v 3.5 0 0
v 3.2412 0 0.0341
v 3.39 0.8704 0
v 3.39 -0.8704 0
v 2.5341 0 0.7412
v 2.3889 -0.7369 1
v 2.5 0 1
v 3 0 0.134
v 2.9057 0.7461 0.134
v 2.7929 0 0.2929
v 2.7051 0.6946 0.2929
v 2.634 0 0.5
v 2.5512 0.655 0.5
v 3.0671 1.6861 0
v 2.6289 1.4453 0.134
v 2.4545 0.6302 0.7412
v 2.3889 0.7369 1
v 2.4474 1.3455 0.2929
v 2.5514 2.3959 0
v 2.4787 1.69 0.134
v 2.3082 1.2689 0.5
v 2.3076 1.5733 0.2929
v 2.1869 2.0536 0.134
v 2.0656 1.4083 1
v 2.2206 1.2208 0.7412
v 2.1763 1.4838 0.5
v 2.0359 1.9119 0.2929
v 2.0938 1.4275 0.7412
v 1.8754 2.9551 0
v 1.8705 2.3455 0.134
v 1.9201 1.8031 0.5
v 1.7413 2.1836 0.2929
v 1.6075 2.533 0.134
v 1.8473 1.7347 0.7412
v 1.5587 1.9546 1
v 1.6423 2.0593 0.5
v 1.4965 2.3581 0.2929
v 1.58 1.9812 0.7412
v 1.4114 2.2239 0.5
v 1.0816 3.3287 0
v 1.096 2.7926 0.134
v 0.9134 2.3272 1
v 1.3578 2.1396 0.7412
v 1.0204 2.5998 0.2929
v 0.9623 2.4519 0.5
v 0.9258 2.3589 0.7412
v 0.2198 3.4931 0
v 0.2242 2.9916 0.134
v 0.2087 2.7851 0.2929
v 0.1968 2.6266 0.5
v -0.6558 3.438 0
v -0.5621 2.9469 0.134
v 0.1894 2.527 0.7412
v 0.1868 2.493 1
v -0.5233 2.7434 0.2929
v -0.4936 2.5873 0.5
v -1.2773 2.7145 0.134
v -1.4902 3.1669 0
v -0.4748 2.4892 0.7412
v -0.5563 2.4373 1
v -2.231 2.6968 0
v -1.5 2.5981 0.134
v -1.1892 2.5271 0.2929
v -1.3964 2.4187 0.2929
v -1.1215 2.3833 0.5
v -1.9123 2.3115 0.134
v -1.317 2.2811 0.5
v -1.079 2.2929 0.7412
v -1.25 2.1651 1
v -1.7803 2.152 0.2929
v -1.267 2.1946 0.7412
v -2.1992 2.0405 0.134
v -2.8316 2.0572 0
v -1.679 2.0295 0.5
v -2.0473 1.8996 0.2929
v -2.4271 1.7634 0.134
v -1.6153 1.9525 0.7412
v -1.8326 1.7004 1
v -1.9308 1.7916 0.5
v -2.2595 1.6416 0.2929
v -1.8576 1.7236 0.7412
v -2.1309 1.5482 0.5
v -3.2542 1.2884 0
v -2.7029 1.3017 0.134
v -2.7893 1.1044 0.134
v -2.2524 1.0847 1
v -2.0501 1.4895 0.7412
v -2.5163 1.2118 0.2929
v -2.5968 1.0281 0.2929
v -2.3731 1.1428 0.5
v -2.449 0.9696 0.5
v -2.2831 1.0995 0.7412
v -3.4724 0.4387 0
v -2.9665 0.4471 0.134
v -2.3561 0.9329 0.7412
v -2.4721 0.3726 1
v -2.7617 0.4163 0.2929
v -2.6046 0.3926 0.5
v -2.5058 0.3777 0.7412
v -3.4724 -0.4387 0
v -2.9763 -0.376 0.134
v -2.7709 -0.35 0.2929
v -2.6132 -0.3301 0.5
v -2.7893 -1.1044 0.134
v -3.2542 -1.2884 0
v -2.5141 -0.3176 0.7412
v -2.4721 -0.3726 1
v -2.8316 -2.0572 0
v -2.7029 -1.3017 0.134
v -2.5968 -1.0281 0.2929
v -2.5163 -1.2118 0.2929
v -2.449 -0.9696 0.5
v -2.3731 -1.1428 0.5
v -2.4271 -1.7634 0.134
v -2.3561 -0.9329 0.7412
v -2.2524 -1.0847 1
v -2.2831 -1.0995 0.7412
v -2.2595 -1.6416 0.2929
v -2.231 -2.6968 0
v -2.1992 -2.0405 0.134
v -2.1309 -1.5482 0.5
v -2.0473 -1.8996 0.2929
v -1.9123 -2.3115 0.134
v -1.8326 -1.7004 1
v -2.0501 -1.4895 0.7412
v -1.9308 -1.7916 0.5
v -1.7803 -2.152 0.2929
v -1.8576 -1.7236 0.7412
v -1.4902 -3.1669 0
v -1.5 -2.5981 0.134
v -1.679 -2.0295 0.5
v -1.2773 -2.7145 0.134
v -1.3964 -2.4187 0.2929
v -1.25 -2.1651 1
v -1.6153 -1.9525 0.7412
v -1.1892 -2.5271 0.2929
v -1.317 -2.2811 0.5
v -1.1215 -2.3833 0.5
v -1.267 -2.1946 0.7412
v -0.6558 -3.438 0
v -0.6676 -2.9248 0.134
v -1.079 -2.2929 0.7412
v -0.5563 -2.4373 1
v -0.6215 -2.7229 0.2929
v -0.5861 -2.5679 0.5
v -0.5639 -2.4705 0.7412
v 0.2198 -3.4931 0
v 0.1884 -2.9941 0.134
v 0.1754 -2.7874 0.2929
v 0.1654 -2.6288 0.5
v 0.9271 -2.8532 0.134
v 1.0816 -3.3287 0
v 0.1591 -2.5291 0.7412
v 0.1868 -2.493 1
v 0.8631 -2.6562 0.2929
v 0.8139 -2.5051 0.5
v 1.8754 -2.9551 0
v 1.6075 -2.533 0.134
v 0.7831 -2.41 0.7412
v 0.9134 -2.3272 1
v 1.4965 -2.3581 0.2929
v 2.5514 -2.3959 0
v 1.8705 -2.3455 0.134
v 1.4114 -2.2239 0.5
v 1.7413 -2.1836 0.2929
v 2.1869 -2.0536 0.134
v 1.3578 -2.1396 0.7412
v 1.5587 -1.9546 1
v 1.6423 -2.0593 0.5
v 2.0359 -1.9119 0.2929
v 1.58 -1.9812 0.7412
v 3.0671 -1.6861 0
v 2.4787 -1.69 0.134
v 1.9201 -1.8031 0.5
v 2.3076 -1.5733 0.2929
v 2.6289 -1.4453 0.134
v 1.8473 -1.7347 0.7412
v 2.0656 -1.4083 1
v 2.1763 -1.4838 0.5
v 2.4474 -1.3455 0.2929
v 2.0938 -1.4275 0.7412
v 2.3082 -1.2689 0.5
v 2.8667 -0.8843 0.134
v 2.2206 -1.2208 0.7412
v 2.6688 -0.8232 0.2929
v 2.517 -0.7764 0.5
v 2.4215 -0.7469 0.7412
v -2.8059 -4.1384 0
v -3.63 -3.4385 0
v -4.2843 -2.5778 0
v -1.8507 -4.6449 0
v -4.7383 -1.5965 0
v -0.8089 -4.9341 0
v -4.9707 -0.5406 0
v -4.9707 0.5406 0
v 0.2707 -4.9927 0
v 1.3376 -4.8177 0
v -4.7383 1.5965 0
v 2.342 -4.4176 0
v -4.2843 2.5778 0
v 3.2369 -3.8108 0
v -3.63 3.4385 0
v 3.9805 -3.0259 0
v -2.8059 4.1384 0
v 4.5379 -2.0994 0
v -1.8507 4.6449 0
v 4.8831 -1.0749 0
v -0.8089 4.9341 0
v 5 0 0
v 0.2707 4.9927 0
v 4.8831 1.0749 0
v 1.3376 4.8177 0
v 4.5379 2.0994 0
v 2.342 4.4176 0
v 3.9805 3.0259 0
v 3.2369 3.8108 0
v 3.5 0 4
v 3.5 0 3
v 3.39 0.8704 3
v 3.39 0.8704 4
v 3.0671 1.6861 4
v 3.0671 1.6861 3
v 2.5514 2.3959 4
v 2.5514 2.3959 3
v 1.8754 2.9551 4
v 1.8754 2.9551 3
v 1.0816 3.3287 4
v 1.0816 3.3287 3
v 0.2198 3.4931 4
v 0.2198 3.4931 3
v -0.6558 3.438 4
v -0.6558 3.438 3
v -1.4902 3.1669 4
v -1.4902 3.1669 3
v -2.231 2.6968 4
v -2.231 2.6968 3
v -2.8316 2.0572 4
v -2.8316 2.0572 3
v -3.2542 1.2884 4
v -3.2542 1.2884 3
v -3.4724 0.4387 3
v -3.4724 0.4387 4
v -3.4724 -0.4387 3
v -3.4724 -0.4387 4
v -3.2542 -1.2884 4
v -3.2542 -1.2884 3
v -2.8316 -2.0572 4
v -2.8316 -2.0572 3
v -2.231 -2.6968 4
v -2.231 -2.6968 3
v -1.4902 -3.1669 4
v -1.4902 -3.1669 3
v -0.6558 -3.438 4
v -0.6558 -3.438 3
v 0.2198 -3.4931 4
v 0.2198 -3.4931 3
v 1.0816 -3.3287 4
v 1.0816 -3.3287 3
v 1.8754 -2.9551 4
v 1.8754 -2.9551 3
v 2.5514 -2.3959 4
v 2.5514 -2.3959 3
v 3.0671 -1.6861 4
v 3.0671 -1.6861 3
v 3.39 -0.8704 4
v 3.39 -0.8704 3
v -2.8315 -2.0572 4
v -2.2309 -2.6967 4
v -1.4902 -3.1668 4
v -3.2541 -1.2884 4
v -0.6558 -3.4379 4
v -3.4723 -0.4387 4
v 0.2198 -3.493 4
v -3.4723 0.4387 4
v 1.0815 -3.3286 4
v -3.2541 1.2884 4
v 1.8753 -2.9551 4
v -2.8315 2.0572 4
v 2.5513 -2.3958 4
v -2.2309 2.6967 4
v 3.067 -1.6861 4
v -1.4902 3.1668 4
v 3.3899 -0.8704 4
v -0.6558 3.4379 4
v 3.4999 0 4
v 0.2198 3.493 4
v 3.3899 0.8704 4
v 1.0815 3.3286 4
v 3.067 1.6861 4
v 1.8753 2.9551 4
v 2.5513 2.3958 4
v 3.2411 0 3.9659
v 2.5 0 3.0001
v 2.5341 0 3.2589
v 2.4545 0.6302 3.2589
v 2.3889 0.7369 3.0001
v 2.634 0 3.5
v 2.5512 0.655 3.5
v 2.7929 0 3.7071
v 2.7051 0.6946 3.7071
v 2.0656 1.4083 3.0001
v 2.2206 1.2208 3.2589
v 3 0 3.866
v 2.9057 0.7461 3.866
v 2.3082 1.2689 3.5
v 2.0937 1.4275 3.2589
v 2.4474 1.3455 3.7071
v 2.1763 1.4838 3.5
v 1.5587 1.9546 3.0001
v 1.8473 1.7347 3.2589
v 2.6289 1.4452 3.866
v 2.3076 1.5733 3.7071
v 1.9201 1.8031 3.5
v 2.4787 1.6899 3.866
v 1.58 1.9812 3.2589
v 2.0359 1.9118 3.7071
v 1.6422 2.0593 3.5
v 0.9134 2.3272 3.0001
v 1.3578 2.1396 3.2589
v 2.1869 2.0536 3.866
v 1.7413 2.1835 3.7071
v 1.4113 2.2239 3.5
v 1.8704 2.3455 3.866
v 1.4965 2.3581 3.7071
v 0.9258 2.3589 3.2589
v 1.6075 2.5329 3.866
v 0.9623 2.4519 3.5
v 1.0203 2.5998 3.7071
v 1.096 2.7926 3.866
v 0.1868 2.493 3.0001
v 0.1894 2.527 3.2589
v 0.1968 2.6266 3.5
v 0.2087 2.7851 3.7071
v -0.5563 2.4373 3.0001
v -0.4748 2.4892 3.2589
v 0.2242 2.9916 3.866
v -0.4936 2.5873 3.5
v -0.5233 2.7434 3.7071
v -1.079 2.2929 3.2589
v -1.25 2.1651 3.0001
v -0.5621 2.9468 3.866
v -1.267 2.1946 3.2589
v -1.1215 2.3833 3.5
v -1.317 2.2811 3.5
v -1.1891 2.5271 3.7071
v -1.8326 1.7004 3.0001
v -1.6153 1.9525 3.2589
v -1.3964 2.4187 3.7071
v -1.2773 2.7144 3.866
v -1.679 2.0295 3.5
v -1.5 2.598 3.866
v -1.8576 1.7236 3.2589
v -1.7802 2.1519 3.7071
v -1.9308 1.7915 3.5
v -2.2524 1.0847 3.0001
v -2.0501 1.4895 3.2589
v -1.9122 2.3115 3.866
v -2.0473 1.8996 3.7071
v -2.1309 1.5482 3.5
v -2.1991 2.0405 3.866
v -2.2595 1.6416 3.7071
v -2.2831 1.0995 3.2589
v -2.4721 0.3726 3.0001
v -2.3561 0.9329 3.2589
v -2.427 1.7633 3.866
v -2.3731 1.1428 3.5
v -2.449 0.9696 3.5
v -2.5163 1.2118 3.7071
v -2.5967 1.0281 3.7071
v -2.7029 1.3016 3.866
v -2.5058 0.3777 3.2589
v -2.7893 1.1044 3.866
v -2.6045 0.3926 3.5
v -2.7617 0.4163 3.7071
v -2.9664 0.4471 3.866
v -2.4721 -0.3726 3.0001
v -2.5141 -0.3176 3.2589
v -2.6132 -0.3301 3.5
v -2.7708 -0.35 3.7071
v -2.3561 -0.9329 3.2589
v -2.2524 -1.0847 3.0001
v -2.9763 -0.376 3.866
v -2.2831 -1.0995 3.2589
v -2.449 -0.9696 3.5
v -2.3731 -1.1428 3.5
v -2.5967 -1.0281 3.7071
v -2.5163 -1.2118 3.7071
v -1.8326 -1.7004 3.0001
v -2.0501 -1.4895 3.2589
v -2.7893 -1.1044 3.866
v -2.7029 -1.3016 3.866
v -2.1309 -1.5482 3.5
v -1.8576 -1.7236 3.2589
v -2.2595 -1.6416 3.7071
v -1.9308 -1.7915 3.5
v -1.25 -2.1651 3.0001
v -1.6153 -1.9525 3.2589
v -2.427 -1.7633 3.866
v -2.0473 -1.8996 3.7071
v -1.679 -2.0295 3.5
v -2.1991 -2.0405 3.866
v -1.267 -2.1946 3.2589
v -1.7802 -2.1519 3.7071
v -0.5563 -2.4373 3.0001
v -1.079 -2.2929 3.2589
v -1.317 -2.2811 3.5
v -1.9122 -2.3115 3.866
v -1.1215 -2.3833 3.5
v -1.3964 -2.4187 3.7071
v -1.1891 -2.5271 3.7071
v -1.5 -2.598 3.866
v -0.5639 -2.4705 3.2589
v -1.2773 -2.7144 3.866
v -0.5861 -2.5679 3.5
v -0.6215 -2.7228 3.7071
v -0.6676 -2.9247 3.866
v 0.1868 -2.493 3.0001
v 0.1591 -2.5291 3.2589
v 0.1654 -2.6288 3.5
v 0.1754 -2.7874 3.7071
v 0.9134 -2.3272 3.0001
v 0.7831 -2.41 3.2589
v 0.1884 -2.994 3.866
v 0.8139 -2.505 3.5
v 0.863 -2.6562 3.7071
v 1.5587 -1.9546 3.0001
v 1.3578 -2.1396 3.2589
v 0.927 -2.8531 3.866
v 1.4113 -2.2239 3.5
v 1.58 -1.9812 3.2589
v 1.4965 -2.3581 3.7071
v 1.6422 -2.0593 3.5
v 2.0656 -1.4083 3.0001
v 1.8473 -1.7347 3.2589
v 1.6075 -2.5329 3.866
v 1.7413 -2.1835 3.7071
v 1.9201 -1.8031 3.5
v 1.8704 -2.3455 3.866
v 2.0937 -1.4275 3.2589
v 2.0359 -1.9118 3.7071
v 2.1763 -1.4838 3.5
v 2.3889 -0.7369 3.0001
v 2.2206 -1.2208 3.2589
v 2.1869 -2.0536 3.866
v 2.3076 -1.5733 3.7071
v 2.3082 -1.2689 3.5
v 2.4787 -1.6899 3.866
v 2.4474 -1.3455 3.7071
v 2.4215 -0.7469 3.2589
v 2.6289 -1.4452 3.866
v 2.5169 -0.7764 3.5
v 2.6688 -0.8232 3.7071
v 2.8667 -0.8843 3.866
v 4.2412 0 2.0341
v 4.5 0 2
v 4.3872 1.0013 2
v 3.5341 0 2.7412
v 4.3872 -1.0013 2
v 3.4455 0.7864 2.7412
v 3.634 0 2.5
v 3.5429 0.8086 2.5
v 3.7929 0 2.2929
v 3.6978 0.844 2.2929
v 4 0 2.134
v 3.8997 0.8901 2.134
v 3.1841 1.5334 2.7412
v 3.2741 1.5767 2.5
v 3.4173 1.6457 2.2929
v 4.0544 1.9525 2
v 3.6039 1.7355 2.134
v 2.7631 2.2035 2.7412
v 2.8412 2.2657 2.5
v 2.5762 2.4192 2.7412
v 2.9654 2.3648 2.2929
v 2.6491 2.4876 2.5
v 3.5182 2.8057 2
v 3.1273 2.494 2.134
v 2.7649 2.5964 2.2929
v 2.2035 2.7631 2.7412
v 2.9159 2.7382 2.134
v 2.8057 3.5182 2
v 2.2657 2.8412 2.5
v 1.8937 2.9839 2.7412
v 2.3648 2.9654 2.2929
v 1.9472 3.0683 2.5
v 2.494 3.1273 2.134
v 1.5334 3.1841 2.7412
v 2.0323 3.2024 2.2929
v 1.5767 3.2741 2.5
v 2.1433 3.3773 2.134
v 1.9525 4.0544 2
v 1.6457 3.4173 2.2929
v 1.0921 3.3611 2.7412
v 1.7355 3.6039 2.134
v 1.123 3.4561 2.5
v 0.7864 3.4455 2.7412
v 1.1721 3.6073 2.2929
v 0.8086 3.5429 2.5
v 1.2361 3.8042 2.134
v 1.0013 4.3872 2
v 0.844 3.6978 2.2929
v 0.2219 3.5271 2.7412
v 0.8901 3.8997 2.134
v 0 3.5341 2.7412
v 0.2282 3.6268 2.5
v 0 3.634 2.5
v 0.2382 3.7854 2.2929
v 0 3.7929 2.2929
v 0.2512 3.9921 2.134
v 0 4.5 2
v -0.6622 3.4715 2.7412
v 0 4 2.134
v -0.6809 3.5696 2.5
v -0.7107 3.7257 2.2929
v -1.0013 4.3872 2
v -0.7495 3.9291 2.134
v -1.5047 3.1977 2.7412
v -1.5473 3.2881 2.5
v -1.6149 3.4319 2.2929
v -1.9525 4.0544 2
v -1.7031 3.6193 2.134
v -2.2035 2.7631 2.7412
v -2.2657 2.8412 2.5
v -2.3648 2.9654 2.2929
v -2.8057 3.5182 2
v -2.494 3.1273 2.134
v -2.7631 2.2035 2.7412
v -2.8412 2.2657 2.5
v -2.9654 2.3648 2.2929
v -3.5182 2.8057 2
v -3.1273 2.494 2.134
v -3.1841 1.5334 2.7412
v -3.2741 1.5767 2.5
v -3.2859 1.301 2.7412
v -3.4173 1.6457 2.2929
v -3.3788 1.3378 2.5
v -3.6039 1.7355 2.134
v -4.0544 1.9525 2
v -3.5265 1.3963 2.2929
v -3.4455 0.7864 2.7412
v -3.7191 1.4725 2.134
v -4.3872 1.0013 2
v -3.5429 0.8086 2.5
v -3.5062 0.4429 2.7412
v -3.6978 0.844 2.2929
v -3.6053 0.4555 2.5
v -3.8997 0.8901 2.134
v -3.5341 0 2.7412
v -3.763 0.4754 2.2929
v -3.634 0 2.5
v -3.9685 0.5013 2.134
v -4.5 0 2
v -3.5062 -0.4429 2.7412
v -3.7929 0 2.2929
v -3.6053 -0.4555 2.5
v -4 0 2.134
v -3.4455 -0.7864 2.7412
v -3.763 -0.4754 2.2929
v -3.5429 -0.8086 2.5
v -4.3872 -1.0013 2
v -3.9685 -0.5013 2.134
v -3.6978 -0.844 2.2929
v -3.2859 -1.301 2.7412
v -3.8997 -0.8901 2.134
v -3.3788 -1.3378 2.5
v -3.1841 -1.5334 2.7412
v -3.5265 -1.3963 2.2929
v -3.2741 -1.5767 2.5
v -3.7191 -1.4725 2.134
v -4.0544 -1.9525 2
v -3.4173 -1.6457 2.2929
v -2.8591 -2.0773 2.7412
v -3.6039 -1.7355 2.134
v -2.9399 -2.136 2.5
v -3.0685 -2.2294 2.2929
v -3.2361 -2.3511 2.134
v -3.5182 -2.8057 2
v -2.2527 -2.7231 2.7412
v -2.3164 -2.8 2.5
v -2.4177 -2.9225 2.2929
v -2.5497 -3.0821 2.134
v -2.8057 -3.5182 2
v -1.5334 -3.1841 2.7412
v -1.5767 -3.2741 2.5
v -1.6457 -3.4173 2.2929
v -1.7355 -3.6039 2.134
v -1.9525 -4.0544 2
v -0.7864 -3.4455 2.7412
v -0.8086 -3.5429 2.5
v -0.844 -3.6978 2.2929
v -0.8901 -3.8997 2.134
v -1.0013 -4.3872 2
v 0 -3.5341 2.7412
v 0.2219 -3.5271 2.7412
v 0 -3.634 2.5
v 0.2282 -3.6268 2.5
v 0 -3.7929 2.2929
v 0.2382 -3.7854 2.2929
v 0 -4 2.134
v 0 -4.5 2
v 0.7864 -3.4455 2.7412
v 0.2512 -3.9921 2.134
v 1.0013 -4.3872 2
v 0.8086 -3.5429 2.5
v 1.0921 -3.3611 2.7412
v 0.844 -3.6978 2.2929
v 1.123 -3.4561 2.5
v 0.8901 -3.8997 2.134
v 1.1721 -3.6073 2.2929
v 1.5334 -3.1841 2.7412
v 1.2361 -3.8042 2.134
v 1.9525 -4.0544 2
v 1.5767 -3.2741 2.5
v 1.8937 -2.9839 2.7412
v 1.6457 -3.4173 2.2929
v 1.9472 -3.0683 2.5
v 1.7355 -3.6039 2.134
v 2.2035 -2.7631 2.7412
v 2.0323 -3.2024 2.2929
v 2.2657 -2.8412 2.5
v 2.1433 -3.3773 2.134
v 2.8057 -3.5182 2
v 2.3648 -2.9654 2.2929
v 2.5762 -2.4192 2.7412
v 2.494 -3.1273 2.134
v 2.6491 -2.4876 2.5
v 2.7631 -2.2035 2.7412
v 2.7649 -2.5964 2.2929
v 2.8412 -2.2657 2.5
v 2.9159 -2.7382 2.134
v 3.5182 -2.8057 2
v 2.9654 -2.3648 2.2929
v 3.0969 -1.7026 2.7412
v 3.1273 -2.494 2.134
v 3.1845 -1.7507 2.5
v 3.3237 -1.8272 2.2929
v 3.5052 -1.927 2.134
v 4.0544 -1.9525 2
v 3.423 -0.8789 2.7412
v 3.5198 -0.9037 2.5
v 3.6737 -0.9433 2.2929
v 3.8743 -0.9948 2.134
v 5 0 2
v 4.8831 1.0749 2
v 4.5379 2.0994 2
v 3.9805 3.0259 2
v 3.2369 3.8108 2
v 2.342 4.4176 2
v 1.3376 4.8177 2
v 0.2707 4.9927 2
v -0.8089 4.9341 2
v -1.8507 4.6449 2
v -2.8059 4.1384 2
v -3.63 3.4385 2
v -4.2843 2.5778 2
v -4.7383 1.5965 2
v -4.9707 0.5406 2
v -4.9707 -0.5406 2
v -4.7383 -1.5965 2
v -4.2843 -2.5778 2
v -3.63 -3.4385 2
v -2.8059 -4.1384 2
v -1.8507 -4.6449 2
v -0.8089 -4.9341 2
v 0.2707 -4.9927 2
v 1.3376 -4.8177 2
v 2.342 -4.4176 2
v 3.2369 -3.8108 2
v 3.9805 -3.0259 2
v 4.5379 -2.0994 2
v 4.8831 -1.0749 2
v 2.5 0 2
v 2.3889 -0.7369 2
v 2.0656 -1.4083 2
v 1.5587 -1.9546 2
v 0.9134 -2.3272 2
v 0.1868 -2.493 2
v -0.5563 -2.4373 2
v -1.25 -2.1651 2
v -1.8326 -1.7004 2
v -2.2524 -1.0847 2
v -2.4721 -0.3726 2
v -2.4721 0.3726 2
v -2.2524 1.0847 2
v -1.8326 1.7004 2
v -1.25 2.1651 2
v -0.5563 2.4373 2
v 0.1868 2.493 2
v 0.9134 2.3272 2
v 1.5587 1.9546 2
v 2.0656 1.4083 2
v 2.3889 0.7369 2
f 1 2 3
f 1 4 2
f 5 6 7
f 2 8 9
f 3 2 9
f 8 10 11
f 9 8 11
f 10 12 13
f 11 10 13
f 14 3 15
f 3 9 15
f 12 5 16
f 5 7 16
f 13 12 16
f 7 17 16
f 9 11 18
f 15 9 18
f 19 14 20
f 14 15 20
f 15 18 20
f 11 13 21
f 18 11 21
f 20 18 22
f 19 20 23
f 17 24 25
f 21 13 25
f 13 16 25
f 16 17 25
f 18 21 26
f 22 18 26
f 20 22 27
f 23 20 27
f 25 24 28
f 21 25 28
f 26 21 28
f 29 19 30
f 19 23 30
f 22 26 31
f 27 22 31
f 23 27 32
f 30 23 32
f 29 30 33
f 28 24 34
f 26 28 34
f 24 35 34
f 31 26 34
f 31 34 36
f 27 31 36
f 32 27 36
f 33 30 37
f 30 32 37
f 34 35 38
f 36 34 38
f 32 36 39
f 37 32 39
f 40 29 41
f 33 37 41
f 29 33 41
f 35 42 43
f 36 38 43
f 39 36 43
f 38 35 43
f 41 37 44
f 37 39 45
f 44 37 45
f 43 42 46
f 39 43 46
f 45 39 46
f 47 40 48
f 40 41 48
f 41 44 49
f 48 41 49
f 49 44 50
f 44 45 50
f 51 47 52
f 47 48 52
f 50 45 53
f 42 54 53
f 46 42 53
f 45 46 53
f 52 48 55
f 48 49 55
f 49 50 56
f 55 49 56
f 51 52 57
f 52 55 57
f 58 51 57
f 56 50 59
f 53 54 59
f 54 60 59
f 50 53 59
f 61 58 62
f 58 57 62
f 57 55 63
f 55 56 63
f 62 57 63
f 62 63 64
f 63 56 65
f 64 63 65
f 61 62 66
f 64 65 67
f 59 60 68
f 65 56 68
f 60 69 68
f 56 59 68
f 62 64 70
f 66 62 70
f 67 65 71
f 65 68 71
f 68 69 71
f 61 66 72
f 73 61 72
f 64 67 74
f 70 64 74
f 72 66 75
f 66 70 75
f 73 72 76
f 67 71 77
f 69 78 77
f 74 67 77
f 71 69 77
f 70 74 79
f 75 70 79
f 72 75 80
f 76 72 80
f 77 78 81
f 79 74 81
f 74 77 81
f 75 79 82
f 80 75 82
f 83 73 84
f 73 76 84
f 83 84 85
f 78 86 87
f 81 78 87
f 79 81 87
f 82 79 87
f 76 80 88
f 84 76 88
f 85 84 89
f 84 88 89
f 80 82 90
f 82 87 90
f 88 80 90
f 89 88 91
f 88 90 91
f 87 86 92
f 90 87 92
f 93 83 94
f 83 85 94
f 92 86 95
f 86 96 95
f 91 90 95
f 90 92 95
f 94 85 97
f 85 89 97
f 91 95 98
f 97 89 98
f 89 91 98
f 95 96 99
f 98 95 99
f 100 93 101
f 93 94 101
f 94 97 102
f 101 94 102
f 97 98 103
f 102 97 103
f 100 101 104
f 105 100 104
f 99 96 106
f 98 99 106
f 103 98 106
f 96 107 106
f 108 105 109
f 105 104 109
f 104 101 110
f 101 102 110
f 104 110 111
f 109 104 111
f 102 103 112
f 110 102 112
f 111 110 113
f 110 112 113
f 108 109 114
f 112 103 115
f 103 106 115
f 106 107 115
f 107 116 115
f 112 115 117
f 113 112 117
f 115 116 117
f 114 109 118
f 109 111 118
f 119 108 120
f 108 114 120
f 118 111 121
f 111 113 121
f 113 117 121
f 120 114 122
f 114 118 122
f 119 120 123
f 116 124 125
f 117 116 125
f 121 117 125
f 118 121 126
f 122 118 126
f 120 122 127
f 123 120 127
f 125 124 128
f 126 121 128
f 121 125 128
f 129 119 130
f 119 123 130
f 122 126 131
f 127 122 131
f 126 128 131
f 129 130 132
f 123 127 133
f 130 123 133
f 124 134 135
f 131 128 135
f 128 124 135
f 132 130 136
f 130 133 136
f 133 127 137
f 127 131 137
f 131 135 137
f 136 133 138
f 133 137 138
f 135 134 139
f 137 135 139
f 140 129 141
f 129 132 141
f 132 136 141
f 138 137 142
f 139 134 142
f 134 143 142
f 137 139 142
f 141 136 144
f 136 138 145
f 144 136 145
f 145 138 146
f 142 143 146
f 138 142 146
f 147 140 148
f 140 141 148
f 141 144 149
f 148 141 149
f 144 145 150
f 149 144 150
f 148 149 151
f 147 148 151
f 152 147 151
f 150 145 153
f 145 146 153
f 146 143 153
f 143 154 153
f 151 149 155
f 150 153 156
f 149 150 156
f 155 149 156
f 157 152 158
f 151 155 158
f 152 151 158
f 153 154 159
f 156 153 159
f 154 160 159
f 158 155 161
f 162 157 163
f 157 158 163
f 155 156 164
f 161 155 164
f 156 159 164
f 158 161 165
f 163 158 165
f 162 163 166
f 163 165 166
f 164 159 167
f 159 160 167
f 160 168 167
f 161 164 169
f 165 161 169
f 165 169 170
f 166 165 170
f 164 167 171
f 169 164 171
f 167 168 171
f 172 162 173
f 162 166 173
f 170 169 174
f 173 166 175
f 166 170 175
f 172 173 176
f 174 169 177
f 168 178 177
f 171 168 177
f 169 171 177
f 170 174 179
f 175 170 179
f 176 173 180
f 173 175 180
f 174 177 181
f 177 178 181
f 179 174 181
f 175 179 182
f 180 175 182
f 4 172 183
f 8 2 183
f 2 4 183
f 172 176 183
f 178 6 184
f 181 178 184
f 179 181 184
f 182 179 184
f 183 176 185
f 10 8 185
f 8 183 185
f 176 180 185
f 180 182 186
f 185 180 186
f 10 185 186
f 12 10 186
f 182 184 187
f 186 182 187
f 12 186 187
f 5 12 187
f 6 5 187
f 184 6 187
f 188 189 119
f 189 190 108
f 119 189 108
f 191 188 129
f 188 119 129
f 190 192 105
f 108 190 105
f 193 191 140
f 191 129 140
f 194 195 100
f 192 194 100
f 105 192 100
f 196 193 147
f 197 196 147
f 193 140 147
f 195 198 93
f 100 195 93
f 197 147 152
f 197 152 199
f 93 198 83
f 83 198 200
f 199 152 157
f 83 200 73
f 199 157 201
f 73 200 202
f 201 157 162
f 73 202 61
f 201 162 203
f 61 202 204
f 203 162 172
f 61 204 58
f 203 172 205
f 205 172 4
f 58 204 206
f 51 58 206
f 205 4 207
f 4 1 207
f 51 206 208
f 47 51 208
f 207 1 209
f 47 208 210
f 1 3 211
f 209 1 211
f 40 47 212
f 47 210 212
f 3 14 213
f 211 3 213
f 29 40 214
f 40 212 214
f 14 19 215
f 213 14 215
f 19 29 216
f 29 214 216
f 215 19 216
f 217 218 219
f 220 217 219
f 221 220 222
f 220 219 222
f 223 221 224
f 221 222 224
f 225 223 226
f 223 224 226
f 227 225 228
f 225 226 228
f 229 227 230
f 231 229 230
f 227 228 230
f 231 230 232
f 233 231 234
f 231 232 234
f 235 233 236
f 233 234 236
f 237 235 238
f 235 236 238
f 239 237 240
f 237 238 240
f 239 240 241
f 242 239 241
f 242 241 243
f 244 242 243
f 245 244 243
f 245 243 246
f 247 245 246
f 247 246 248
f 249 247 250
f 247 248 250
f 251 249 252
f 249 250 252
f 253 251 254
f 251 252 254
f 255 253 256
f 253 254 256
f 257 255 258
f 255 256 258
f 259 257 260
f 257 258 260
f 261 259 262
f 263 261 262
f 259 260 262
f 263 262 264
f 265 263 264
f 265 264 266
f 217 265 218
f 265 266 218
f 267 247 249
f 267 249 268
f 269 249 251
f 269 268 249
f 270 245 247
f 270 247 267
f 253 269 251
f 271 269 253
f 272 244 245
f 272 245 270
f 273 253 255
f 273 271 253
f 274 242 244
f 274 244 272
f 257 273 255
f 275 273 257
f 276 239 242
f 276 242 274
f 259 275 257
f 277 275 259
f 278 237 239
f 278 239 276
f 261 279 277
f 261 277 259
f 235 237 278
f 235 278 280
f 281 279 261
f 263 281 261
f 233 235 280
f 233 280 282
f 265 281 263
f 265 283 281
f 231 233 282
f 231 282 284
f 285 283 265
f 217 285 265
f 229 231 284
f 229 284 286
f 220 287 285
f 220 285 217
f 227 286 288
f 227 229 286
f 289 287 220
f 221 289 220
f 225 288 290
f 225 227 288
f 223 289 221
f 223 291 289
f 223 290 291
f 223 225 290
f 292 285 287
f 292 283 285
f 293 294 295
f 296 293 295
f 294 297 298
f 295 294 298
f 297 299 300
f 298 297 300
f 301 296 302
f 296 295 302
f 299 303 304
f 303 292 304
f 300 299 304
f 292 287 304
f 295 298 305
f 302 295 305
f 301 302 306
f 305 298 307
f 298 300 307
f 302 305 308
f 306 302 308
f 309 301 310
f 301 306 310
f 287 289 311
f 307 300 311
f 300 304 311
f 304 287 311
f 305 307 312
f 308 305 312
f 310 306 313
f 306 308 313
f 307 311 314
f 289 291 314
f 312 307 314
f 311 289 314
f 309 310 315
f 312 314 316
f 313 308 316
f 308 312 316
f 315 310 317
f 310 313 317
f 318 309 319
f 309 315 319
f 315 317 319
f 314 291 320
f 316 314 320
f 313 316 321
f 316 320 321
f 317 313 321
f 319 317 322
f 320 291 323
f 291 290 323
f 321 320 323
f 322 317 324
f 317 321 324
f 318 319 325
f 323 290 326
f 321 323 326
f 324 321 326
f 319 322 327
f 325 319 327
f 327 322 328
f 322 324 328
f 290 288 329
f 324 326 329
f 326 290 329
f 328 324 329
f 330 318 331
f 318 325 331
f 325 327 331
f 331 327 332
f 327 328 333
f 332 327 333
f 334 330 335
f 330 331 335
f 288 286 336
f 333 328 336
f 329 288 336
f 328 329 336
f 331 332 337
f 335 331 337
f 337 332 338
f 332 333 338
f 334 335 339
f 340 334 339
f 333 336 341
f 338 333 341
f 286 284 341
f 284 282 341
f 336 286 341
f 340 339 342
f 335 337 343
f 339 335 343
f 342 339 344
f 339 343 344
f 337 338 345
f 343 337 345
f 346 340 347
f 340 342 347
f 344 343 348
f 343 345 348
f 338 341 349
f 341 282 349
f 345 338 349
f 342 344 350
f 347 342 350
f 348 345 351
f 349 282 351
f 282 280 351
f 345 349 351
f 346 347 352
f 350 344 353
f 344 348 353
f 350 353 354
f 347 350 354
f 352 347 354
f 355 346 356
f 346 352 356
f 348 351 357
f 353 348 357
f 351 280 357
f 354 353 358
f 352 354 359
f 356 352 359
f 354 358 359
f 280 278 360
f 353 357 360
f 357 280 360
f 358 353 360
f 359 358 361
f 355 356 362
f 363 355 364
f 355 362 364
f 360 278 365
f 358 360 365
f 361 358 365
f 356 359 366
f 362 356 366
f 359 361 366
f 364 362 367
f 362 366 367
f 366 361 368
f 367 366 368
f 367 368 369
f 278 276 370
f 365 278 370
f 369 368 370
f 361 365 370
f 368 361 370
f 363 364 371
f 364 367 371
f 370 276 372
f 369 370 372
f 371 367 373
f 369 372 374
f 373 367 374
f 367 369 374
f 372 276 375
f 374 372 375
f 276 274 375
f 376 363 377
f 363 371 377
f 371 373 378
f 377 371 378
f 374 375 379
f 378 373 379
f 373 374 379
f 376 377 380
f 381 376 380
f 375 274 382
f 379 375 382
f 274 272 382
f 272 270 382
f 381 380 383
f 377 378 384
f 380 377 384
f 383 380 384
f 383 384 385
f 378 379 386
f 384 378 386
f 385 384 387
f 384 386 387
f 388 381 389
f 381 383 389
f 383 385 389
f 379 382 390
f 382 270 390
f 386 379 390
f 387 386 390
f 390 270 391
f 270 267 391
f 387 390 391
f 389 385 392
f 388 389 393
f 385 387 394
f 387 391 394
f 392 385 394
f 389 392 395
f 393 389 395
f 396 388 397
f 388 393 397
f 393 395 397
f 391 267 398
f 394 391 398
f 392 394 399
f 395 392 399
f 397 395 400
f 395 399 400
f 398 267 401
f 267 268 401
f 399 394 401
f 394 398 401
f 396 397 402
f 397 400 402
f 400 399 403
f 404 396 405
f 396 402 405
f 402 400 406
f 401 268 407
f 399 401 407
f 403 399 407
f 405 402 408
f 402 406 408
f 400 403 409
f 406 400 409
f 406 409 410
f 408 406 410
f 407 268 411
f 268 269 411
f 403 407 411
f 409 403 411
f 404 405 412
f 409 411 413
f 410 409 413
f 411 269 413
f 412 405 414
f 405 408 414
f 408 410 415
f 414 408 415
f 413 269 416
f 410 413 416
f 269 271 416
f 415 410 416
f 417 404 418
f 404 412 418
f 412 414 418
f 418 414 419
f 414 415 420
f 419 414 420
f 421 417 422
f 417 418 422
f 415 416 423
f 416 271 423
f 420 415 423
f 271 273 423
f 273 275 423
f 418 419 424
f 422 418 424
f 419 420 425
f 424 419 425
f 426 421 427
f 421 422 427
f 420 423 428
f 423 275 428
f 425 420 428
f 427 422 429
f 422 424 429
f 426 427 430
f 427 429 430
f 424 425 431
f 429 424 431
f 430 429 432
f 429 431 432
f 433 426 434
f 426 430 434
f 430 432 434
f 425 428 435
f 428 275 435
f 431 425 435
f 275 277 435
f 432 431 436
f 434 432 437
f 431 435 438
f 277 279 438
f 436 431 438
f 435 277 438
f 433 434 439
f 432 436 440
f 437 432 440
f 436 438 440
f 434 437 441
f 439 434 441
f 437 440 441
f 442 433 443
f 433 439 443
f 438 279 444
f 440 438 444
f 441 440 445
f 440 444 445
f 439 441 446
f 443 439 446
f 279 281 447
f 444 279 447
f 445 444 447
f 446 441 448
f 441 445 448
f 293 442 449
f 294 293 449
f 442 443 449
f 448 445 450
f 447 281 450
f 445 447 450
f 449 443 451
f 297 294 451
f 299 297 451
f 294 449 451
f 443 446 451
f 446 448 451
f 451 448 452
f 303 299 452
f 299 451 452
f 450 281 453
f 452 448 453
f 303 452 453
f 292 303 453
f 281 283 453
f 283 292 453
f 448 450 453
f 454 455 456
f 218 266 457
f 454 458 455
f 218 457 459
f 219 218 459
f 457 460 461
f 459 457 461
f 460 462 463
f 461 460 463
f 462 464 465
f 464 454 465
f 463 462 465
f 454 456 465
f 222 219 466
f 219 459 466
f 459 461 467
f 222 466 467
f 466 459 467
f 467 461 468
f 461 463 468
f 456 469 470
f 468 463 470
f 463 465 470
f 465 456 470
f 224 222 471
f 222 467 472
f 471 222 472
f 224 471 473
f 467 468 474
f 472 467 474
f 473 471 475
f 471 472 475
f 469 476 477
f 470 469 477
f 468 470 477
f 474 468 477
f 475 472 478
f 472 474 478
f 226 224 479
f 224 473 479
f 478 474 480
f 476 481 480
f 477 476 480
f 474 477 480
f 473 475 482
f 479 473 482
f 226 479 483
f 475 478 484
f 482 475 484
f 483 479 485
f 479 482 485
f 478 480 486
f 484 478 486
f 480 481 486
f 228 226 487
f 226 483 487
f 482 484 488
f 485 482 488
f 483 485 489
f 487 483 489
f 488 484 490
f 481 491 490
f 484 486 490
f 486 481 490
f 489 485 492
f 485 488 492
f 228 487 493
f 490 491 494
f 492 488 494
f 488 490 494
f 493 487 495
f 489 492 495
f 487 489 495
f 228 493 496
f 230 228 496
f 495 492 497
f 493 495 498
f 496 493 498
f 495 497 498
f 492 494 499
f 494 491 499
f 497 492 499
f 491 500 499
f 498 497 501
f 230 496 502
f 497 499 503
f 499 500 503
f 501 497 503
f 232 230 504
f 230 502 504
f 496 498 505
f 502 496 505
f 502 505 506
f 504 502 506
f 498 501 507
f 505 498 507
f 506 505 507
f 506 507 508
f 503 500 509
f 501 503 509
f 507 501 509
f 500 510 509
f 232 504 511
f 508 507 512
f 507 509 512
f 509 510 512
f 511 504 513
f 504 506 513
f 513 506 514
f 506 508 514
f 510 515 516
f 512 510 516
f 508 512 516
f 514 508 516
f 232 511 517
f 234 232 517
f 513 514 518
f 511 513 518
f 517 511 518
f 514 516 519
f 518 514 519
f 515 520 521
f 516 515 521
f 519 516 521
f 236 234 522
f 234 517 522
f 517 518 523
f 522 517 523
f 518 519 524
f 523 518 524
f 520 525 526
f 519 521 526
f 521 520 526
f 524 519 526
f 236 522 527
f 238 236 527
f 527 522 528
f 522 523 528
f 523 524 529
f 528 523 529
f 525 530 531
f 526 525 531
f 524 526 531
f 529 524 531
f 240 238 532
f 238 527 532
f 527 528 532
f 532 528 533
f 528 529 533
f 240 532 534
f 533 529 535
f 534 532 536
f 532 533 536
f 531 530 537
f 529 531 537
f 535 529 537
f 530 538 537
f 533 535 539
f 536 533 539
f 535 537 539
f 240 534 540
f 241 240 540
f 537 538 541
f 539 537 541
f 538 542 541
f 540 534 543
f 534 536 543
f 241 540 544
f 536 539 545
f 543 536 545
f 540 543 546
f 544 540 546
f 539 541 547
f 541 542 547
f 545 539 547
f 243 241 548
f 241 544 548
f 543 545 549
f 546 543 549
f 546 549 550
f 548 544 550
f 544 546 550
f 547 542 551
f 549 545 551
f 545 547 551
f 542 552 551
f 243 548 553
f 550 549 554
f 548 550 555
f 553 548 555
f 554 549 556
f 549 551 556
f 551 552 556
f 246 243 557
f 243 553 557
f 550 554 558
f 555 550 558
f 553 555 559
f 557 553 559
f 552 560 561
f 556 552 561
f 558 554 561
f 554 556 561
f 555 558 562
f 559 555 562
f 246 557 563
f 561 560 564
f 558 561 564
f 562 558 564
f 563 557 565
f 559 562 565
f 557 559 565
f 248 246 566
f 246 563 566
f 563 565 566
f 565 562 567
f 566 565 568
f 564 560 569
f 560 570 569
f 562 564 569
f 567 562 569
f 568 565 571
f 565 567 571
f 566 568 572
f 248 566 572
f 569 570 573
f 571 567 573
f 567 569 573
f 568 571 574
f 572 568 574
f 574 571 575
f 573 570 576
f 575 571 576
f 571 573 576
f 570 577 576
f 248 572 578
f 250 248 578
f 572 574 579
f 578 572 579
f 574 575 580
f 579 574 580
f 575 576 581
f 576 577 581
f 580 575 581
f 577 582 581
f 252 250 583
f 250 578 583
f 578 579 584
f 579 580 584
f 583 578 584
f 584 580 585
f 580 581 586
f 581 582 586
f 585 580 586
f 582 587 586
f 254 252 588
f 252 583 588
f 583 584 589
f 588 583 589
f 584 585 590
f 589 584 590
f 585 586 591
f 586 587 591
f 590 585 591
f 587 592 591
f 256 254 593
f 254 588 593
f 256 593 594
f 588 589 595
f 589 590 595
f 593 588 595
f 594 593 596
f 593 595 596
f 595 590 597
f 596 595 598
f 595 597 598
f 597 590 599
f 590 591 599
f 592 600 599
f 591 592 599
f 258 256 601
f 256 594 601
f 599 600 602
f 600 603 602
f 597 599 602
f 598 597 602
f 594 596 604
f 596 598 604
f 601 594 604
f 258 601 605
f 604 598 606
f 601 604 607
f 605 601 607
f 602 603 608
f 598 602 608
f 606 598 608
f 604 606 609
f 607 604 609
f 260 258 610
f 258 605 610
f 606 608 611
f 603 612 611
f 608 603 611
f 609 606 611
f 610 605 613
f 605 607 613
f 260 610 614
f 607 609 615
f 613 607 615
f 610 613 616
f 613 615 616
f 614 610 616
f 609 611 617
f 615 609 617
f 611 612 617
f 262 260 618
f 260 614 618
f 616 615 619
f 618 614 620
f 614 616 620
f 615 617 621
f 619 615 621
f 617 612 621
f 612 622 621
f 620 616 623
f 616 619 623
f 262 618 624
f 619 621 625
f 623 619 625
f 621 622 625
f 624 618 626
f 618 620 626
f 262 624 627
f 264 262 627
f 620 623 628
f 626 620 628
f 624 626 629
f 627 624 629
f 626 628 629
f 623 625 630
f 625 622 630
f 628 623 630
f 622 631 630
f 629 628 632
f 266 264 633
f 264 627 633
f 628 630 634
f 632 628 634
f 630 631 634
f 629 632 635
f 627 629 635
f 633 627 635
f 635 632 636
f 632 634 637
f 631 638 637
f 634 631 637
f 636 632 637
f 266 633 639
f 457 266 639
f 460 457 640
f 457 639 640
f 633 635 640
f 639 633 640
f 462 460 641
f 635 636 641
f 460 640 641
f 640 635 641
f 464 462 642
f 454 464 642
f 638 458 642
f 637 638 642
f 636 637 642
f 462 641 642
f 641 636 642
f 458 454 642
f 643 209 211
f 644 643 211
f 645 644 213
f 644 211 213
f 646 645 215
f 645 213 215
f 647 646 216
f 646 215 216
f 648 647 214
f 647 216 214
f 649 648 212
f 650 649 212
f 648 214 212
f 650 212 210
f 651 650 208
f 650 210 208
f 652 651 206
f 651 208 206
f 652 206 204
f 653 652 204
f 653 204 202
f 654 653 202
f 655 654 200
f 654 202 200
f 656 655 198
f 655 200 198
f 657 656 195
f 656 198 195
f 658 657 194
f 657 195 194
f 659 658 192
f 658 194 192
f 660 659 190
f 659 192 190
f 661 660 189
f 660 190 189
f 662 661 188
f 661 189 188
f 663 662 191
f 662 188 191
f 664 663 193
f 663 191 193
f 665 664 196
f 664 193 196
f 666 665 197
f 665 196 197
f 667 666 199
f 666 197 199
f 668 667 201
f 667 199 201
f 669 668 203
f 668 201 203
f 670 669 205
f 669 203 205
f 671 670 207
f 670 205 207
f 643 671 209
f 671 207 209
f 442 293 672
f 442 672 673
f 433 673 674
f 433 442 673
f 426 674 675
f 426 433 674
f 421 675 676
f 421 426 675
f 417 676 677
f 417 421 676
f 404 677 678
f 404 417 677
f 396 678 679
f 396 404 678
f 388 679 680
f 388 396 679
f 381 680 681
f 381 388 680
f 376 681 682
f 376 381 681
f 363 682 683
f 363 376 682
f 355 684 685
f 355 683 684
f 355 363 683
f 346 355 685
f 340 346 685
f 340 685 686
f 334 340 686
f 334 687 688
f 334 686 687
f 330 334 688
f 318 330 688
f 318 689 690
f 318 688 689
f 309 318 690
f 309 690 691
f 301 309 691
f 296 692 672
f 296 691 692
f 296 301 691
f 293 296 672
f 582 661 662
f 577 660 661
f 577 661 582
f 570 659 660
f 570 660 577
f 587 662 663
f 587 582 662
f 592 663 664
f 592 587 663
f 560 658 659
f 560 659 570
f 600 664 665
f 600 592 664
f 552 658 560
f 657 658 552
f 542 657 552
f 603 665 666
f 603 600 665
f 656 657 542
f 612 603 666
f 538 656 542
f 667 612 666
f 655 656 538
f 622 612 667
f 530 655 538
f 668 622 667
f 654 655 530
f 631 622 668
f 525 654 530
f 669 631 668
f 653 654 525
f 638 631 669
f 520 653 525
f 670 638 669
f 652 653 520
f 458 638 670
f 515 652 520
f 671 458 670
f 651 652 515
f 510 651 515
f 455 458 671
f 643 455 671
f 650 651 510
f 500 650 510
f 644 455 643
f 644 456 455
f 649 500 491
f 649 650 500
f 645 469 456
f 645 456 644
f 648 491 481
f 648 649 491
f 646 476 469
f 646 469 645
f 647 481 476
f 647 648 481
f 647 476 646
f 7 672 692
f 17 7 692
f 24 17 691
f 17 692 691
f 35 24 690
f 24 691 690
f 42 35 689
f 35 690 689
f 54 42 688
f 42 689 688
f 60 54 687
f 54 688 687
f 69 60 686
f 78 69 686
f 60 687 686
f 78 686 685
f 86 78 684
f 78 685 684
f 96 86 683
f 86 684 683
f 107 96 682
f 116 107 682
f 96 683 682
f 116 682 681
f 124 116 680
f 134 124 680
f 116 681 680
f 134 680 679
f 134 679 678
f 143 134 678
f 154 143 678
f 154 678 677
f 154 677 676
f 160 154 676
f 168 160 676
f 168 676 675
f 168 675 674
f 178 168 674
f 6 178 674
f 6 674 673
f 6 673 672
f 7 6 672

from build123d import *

# Parameters (mm, degrees)
SKETCH1_R           = 5
BOSS_EXTRUDE1_DEPTH = 2
SKETCH2_R           = 2.5
CUT_EXTRUDE1_DEPTH  = 10
SKETCH3_R           = 3.5
BOSS_EXTRUDE2_DEPTH = 2
CUT_EXTRUDE2_START  = -3
SKETCH4_R           = 2.5
CUT_EXTRUDE2_DEPTH  = 3
FILLET1_R           = 1
FILLET2_R           = 1
FILLET3_R           = 1


with BuildPart() as part:
    # Sketch1 → Boss-Extrude1 (new body)
    with BuildSketch(Plane.XY):
        Circle(SKETCH1_R)
    extrude(amount=BOSS_EXTRUDE1_DEPTH)

    # Sketch2 → Cut-Extrude1 (cut)
    with BuildSketch(Plane.XY.offset(2)):
        Circle(SKETCH2_R)
    extrude(amount=-CUT_EXTRUDE1_DEPTH, mode=Mode.SUBTRACT)

    # Sketch3 → Boss-Extrude2 (add)
    with BuildSketch(Plane.XY.offset(2)):
        Circle(SKETCH3_R)
    extrude(amount=BOSS_EXTRUDE2_DEPTH)

    # Sketch4 → Cut-Extrude2 (cut)
    with BuildSketch(Plane(origin=(0, 0, 2), x_dir=(-1, 0, 0), z_dir=(0, 0, -1)).offset(CUT_EXTRUDE2_START)):
        with Locations(Location((0, 0, 0), (0, 0, 180))):
            Circle(SKETCH4_R)
    extrude(amount=CUT_EXTRUDE2_DEPTH, mode=Mode.SUBTRACT)

    # Fillet1
    fillet1_edges = [part.edges().sort_by_distance(p)[0] for p in [
        (-2.5, 0, 0),
    ]]
    fillet(fillet1_edges, radius=FILLET1_R)

    # Fillet2
    fillet2_edges = [part.edges().sort_by_distance(p)[0] for p in [
        (-2.5, 0, 4),
    ]]
    fillet(fillet2_edges, radius=FILLET2_R - 0.0001)  # a hair under: the kernel refuses the full size

    # Fillet3
    fillet3_edges = [part.edges().sort_by_distance(p)[0] for p in [
        (-3.5, 0, 2),
    ]]
    fillet(fillet3_edges, radius=FILLET3_R)


solid = part.part
